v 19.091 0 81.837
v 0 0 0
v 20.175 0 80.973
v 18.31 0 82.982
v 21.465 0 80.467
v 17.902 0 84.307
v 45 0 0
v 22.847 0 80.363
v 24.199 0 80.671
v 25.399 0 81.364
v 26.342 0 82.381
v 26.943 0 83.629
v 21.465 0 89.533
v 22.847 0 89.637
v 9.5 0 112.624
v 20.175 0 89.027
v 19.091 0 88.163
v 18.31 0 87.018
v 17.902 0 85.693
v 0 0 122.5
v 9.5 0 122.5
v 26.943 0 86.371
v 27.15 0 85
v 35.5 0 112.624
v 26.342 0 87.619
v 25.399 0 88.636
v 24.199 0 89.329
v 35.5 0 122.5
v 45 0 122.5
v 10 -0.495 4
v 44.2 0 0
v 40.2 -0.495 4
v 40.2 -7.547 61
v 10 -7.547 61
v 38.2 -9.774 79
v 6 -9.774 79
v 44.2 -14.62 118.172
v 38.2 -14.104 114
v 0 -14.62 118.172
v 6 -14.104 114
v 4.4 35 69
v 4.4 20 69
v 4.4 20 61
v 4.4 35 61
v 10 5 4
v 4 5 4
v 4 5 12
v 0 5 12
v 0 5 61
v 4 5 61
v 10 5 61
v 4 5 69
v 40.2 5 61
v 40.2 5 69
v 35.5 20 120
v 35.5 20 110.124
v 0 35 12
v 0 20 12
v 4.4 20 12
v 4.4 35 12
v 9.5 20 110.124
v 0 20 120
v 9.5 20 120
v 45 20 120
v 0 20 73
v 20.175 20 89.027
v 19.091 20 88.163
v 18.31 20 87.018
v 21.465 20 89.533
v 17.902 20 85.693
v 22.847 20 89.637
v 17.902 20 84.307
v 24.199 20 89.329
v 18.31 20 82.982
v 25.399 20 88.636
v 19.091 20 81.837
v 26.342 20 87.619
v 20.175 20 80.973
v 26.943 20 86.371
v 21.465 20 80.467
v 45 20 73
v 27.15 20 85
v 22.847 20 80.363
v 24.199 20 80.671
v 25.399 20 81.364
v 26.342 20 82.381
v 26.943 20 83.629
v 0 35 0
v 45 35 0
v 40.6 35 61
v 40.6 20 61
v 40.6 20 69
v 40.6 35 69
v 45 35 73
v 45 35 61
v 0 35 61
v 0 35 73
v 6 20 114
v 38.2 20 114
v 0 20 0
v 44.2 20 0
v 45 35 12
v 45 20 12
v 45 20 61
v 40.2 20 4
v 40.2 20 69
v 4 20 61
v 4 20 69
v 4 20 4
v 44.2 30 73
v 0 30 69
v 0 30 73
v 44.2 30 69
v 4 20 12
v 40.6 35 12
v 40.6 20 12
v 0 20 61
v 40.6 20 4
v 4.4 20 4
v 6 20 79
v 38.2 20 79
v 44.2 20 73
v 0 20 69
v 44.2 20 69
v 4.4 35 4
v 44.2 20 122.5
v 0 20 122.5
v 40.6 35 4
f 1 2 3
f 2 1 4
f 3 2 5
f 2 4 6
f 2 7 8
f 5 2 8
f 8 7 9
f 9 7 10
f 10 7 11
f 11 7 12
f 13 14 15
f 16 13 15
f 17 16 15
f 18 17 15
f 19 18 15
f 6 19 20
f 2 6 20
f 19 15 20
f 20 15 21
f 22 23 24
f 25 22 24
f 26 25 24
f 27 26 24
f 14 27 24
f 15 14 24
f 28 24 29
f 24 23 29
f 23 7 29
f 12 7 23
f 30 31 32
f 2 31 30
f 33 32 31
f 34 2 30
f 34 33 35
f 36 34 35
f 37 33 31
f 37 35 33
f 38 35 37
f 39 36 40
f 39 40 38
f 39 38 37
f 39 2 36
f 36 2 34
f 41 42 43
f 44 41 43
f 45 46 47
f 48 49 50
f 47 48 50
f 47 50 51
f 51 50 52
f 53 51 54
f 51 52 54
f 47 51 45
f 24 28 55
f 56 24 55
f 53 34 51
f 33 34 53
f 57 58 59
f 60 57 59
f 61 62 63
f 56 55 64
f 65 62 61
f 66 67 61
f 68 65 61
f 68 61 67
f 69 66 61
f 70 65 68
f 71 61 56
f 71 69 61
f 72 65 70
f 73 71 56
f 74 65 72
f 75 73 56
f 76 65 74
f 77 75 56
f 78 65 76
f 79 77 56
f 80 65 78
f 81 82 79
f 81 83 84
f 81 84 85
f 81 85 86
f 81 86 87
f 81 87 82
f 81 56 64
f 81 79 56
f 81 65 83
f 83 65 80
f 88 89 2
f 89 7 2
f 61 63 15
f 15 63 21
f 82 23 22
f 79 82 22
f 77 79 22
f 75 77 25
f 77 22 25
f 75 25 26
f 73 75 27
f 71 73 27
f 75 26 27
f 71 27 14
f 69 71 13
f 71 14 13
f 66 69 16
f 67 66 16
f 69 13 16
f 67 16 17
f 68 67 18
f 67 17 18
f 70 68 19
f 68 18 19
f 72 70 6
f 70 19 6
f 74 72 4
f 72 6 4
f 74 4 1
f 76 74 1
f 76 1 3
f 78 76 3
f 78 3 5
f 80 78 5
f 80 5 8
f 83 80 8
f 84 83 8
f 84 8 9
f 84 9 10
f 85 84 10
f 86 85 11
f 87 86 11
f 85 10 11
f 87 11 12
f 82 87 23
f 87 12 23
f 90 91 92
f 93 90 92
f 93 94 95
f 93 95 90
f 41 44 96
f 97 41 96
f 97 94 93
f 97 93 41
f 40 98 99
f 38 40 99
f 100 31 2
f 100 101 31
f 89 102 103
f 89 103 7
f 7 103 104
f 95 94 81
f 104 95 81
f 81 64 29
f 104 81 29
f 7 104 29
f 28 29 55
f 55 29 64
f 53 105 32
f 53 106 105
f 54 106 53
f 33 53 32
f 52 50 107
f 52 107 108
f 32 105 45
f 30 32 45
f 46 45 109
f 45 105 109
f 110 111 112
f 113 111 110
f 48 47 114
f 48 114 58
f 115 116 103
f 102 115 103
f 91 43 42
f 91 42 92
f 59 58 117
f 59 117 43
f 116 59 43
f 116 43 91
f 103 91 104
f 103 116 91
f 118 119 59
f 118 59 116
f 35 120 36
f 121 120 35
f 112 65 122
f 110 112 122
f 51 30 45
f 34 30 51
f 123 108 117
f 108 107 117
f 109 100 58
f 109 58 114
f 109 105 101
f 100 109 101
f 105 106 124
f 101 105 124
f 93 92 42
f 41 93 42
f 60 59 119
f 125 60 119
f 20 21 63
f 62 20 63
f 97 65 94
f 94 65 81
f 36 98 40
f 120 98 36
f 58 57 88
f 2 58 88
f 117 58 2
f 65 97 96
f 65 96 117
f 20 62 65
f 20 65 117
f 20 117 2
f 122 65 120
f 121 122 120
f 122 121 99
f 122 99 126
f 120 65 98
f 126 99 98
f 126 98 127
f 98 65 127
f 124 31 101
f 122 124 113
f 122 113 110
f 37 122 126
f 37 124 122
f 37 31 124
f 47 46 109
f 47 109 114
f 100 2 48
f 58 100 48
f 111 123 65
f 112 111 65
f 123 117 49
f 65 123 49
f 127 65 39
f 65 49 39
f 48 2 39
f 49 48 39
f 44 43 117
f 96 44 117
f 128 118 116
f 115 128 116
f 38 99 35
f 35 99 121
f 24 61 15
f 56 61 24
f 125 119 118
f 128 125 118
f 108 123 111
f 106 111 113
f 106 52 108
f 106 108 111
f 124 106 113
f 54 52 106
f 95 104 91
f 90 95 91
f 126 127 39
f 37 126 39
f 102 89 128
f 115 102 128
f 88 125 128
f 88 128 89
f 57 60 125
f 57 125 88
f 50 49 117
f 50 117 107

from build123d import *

# Parameters (mm, degrees)
SKETCH_W        = 45
SKETCH_H        = 20
PAD_DEPTH       = 120
PAD001_DEPTH    = 45
SKETCH002_R     = 4.65
POCKET_DEPTH    = 20
PAD002_DEPTH    = 15
PAD003_DEPTH    = 15
POCKET001_DEPTH = 9.8
SKETCH005_W     = 10
SKETCH005_H     = 73
PAD004_DEPTH    = 5
PAD005_DEPTH    = 15
PAD006_DEPTH    = 5
PAD007_DEPTH    = 15
PAD008_DEPTH    = 5
SKETCH008_W     = 44.2
SKETCH008_H     = 4
PAD009_DEPTH    = 10
SKETCH009_W     = 30.2
SKETCH009_H     = 5
PAD010_DEPTH    = 8
SKETCH011_W     = 4
SKETCH011_H     = 5
PAD011_DEPTH    = 49
SKETCH013_W     = 4
SKETCH013_H     = 15
PAD012_DEPTH    = 49
SKETCH014_W     = 44.2
SKETCH014_H     = 20
PAD013_DEPTH    = 47
PAD014_DEPTH    = 44.2
PAD015_DEPTH    = 44.2
SKETCH017_W     = 30.2
SKETCH017_H     = 57
POCKET002_DEPTH = 10
SKETCH018_W     = 32.2
SKETCH018_H     = 35
POCKET003_DEPTH = 50


with BuildPart() as body:
    # Sketch → Pad (new body)
    with BuildSketch(Plane.XY):
        with Locations((22.5, 10)):
            Rectangle(SKETCH_W, SKETCH_H)
    extrude(amount=PAD_DEPTH)

    # Sketch001 (on Face2 of Pad) → Pad001 (join)
    with BuildSketch(Plane.YZ.offset(45)):
        Polygon((0, 120), (0, 122.5), (20, 120), align=None)
    extrude(amount=-PAD001_DEPTH)

    # Sketch002 (on Face6 of Pad001) → Pocket (cut)
    with BuildSketch(Plane.XZ):
        with Locations((22.5, 85)):
            Circle(SKETCH002_R)
    extrude(amount=-POCKET_DEPTH, mode=Mode.SUBTRACT)

    # Sketch003 (on Face1 of Pocket) → Pad002 (join)
    with BuildSketch(Plane(origin=(0, 20, 0), x_dir=(-1, 0, 0), z_dir=(0, 1, 0))):
        Polygon((-4.4, 4), (-40.6, 4), (-40.6, 12), (-45, 12), (-45, 0), (0, 0), (0, 12), (-4.4, 12), align=None)
    extrude(amount=PAD002_DEPTH)

    # Sketch004 (on Face1 of Pad002) → Pad003 (join)
    with BuildSketch(Plane(origin=(0, 20, 0), x_dir=(-1, 0, 0), z_dir=(0, 1, 0))):
        Polygon((0, 73), (-45, 73), (-45, 61), (-40.6, 61), (-40.6, 69), (-4.4, 69), (-4.4, 61), (0, 61), align=None)
    extrude(amount=PAD003_DEPTH)

    # Sketch010 (on Face27 of Pad003) → Pocket001 (cut)
    with BuildSketch(Plane(origin=(0, 15.0769230769, 120.6153846154), x_dir=(1, 0, 0), z_dir=(0, 0.1240347346, 0.9922778767))):
        Polygon((9.5, 4.9613893836), (9.5, -15.1942549872), (35.5, -15.1942549872), (35.5, 4.9613893836), (35.5, 6.9613893836), (9.5, 6.9613893836), align=None)
    extrude(amount=-POCKET001_DEPTH, mode=Mode.SUBTRACT)


with BuildPart() as batteryrearmotorholder001:
    # Sketch005 → Pad004 (new body)
    with BuildSketch(Plane.XZ):
        with Locations((5, 36.5)):
            Rectangle(SKETCH005_W, SKETCH005_H)
    extrude(amount=-PAD004_DEPTH)

    # Sketch006 (on Face6 of Pad004) → Pad005 (join)
    with BuildSketch(Plane(origin=(0, 5, 0), x_dir=(1, 0, 0), z_dir=(0, 1, 0))):
        Polygon((0, 0), (10, 0), (44.2, 0), (44.2, -12), (40.2, -12), (40.2, -4), (4, -4), (4, -12), (0, -12), align=None)
    extrude(amount=PAD005_DEPTH)

    # Sketch006 (on Face6 of Pad004) → Pad006 (join)
    with BuildSketch(Plane(origin=(0, 5, 0), x_dir=(1, 0, 0), z_dir=(0, 1, 0))):
        Polygon((0, 0), (10, 0), (44.2, 0), (44.2, -12), (40.2, -12), (40.2, -4), (4, -4), (4, -12), (0, -12), align=None)
    extrude(amount=-PAD006_DEPTH)

    # Sketch007 (on Face6 of Pad004) → Pad007 (join)
    with BuildSketch(Plane(origin=(0, 5, 0), x_dir=(1, 0, 0), z_dir=(0, 1, 0))):
        Polygon((0, -73), (0, -61), (4, -61), (4, -69), (40.2, -69), (40.2, -61), (44.2, -61), (44.2, -73), align=None)
    extrude(amount=PAD007_DEPTH)

    # Sketch007 (on Face6 of Pad004) → Pad008 (join)
    with BuildSketch(Plane(origin=(0, 5, 0), x_dir=(1, 0, 0), z_dir=(0, 1, 0))):
        Polygon((0, -73), (0, -61), (4, -61), (4, -69), (40.2, -69), (40.2, -61), (44.2, -61), (44.2, -73), align=None)
    extrude(amount=-PAD008_DEPTH)

    # Sketch008 (on Face33 of Pad008) → Pad009 (join)
    with BuildSketch(Plane(origin=(0, 20, 0), x_dir=(1, 0, 0), z_dir=(0, 1, 0))):
        with Locations((22.1, -71)):
            Rectangle(SKETCH008_W, SKETCH008_H)
    extrude(amount=PAD009_DEPTH)

    # Sketch009 (on Face32 of Pad009) → Pad010 (join)
    with BuildSketch(Plane(origin=(0, 0, 69), x_dir=(1, 0, 0), z_dir=(0, 0, -1))):
        with Locations((25.1, -2.5)):
            Rectangle(SKETCH009_W, SKETCH009_H)
    extrude(amount=PAD010_DEPTH)

    # Sketch011 (on Face16 of Pad009) → Pad011 (join)
    with BuildSketch(Plane(origin=(0, 0, 12), x_dir=(-1, 0, 0), z_dir=(0, 0, 1))):
        with Locations((-42.2, -2.5)):
            Rectangle(SKETCH011_W, SKETCH011_H)
    extrude(amount=PAD011_DEPTH)

    # Sketch013 (on Face45 of Pad011) → Pad012 (join)
    with BuildSketch(Plane(origin=(0, 0, 61), x_dir=(1, 0, 0), z_dir=(0, 0, -1))):
        with Locations((42.2, -12.5)):
            Rectangle(SKETCH013_W, SKETCH013_H)
    extrude(amount=PAD012_DEPTH)

    # Sketch014 (on Face44 of Pad012) → Pad013 (join)
    with BuildSketch(Plane(origin=(0, 0, 73), x_dir=(-1, 0, 0), z_dir=(0, 0, 1))):
        with Locations((-22.1, -10)):
            Rectangle(SKETCH014_W, SKETCH014_H)
    extrude(amount=PAD013_DEPTH)

    # Sketch015 (on Face33 of Pad013) → Pad014 (join)
    with BuildSketch(Plane(origin=(0, 0, 0), x_dir=(0, 0, -1), z_dir=(-1, 0, 0))):
        Polygon((-120, 0), (-120, -20), (-122.5, -20), align=None)
    extrude(amount=-PAD014_DEPTH)

    # Sketch016 (on Face33 of Pad014) → Pad015 (join)
    with BuildSketch(Plane(origin=(0, 0, 0), x_dir=(0, 0, -1), z_dir=(-1, 0, 0))):
        Polygon((-120, 0), (0, 0), (-118.1725, 14.62), align=None)
    extrude(amount=-PAD015_DEPTH)

    # Sketch017 (on Face48 of Pad015) → Pocket002 (cut)
    with BuildSketch(Plane(origin=(0, 0, 0), x_dir=(1, 0, 0), z_dir=(0, 1, 0))):
        with Locations((25.1, -32.5)):
            Rectangle(SKETCH017_W, SKETCH017_H)
    extrude(amount=-POCKET002_DEPTH, mode=Mode.SUBTRACT)

    # Sketch018 (on Face36 of Pocket002) → Pocket003 (cut)
    with BuildSketch(Plane(origin=(0, 20, 0), x_dir=(1, 0, 0), z_dir=(0, 1, 0))):
        with Locations((22.1, -96.5)):
            Rectangle(SKETCH018_W, SKETCH018_H)
    extrude(amount=-POCKET003_DEPTH, mode=Mode.SUBTRACT)


solid = Compound([body.part, batteryrearmotorholder001.part])
